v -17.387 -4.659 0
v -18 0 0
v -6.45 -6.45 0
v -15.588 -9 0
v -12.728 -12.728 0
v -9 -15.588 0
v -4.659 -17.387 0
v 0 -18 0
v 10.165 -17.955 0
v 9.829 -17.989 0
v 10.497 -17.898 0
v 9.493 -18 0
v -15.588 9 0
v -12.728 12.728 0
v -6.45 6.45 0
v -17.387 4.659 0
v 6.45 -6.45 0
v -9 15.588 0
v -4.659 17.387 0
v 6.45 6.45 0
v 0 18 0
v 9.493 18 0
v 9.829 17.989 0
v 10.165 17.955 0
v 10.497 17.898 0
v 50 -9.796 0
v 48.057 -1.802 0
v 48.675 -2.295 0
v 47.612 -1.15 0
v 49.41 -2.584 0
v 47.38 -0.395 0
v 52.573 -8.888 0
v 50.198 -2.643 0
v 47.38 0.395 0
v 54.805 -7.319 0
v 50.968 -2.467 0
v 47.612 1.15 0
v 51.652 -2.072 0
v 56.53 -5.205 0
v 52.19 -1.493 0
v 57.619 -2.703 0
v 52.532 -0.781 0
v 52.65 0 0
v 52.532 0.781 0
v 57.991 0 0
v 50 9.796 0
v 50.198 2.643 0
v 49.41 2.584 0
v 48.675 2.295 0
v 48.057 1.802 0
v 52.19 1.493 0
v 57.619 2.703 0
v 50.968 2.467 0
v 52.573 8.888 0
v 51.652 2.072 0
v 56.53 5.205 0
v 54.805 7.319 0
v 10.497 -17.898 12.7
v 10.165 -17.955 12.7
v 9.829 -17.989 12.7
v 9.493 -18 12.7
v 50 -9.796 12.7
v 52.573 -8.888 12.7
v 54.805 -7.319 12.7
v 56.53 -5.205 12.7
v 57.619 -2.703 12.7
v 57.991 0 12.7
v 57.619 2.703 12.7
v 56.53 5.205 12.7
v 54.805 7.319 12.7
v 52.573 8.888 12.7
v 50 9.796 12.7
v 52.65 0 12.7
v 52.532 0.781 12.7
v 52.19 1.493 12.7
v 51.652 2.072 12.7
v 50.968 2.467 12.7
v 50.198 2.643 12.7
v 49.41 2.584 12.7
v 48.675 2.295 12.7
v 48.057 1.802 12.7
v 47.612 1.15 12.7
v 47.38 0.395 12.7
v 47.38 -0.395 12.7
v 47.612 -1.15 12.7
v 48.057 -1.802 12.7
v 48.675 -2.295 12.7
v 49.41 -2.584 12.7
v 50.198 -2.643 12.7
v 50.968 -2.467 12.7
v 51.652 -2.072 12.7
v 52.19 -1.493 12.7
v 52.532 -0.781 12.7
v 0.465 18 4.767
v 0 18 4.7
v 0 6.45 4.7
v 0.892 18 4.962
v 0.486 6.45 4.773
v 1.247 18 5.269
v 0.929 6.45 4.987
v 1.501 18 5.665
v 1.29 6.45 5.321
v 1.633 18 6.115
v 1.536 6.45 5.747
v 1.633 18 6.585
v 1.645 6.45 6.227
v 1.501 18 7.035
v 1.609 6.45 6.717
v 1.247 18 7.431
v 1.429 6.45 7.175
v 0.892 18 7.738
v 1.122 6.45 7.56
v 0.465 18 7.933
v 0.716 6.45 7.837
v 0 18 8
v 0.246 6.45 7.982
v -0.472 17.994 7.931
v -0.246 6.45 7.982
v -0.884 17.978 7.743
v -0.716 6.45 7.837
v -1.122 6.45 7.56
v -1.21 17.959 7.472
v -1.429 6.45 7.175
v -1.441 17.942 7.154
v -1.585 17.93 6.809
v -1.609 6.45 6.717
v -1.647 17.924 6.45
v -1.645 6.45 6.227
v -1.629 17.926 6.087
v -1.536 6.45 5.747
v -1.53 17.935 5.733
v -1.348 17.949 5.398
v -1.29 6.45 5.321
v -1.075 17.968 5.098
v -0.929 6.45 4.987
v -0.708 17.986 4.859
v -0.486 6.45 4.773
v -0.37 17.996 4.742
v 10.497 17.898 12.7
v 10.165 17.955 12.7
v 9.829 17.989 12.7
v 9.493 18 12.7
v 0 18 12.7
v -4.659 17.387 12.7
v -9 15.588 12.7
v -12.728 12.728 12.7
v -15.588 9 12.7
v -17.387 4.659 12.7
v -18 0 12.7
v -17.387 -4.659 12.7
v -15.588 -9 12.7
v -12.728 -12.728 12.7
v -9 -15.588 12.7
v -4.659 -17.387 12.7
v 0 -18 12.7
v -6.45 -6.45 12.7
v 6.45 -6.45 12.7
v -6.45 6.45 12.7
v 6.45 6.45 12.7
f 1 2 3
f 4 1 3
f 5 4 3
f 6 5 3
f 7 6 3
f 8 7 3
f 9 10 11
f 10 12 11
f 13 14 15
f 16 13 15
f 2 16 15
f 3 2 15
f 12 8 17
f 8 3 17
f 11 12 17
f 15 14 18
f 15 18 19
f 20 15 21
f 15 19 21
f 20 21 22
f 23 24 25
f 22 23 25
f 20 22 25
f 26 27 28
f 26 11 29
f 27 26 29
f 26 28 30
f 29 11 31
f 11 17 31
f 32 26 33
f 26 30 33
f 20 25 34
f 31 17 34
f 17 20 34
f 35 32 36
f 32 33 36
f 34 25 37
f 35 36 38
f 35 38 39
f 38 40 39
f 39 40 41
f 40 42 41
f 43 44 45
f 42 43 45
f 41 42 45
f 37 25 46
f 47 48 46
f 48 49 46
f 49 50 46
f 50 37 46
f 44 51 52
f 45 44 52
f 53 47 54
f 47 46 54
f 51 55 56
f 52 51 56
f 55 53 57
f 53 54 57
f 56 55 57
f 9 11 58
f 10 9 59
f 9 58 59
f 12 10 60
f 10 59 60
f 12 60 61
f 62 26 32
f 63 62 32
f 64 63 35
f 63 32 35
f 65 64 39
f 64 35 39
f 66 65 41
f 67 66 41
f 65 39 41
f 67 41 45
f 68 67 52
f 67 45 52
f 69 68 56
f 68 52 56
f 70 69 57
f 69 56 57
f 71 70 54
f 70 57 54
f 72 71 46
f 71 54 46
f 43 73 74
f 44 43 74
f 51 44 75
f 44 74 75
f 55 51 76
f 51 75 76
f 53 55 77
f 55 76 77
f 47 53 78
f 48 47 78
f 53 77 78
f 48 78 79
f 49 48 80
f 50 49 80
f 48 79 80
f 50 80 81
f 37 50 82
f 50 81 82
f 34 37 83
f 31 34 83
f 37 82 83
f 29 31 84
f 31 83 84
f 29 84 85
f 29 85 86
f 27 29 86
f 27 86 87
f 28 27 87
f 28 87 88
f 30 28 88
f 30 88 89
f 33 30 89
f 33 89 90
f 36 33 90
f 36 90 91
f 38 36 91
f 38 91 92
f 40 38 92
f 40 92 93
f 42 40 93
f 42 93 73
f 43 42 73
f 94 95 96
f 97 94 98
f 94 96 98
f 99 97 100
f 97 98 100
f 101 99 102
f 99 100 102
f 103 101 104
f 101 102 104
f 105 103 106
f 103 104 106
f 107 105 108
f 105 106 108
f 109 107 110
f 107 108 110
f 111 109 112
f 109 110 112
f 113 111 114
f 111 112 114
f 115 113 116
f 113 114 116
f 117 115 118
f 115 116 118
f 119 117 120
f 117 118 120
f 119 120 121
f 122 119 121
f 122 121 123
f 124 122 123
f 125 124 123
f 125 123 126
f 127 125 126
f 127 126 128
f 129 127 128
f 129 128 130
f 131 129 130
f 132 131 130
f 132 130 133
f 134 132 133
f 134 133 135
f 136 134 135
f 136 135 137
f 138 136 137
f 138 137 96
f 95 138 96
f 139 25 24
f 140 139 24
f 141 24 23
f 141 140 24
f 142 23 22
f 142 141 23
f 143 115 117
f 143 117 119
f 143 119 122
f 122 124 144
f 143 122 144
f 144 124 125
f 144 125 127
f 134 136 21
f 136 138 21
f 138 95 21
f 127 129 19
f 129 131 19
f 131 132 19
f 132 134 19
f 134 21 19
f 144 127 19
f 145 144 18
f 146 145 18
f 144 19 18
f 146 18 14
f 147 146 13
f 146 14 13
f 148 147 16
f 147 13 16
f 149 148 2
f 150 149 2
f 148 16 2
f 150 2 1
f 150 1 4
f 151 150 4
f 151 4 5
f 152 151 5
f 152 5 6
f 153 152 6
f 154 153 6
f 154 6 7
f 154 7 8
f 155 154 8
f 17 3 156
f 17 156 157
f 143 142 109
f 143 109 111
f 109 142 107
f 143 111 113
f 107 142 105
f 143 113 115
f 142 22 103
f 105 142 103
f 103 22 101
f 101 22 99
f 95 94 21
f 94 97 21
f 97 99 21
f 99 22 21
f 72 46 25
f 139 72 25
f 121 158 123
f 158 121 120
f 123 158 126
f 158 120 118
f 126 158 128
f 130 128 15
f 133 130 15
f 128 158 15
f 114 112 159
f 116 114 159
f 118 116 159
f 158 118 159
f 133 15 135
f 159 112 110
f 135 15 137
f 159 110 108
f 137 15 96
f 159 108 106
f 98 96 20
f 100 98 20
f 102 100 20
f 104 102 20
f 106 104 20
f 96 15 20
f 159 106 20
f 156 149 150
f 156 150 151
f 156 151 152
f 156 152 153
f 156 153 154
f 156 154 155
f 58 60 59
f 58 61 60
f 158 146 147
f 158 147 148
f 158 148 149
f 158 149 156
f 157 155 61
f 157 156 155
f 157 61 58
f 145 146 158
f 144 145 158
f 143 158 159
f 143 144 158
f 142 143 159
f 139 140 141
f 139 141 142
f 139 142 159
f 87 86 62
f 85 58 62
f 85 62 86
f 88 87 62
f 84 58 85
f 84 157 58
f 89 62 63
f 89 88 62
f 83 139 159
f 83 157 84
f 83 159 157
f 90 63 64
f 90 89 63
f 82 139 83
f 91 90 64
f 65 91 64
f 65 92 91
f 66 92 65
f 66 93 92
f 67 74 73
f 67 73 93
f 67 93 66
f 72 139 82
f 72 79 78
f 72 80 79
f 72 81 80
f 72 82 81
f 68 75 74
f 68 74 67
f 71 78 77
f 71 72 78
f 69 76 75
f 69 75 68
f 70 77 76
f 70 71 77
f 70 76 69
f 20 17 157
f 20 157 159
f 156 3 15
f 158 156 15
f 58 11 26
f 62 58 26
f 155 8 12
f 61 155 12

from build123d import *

# Parameters (mm, degrees)
SKETCH1_W                       = 12.9
SKETCH1_H                       = 12.9
BOSS_EXTRUDE1_DEPTH             = 12.7
TAP_DRILL_FOR_M4X0_7_TAP1_D     = 3.3
TAP_DRILL_FOR_M4X0_7_TAP1_DEPTH = 11.55
M5_CLEARANCE_HOLE1_D            = 5.3
FILLET1_R                       = 5


with BuildPart() as part:
    # Sketch1 → Boss-Extrude1 (new body)
    with BuildSketch(Plane.XY):
        with BuildLine():
            ThreePointArc((50, -9.796085513), (57.990843804, 0), (50, 9.796085513))
            Line((50, 9.796085513), (10, 18))
            Line((10, 18), (0, 18))
            ThreePointArc((0, 18), (-18, 0), (0, -18))
            Line((0, -18), (10, -18))
            Line((10, -18), (50, -9.796085513))
        make_face()
        Rectangle(SKETCH1_W, SKETCH1_H, mode=Mode.SUBTRACT)
    extrude(amount=BOSS_EXTRUDE1_DEPTH)

    # Tap Drill for M4x0.7 Tap1
    with Locations(Plane(origin=(0, 18, 6.35), x_dir=(0, 0, 1), z_dir=(0, 1, 0))):
        with Locations((0, 0)):
            Hole(TAP_DRILL_FOR_M4X0_7_TAP1_D / 2, depth=TAP_DRILL_FOR_M4X0_7_TAP1_DEPTH)

    # M5 Clearance Hole1 (through all)
    with Locations(Plane(origin=(50, 0, 0), x_dir=(-1, 0, 0), z_dir=(0, 0, -1))):
        with Locations((0, 0)):
            Hole(M5_CLEARANCE_HOLE1_D / 2)

    # Fillet1
    fillet1_edges = [part.edges().sort_by_distance(p)[0] for p in [
        (10, 18, 6.35),
        (10, -18, 6.35),
    ]]
    fillet(fillet1_edges, radius=FILLET1_R)


solid = part.part
